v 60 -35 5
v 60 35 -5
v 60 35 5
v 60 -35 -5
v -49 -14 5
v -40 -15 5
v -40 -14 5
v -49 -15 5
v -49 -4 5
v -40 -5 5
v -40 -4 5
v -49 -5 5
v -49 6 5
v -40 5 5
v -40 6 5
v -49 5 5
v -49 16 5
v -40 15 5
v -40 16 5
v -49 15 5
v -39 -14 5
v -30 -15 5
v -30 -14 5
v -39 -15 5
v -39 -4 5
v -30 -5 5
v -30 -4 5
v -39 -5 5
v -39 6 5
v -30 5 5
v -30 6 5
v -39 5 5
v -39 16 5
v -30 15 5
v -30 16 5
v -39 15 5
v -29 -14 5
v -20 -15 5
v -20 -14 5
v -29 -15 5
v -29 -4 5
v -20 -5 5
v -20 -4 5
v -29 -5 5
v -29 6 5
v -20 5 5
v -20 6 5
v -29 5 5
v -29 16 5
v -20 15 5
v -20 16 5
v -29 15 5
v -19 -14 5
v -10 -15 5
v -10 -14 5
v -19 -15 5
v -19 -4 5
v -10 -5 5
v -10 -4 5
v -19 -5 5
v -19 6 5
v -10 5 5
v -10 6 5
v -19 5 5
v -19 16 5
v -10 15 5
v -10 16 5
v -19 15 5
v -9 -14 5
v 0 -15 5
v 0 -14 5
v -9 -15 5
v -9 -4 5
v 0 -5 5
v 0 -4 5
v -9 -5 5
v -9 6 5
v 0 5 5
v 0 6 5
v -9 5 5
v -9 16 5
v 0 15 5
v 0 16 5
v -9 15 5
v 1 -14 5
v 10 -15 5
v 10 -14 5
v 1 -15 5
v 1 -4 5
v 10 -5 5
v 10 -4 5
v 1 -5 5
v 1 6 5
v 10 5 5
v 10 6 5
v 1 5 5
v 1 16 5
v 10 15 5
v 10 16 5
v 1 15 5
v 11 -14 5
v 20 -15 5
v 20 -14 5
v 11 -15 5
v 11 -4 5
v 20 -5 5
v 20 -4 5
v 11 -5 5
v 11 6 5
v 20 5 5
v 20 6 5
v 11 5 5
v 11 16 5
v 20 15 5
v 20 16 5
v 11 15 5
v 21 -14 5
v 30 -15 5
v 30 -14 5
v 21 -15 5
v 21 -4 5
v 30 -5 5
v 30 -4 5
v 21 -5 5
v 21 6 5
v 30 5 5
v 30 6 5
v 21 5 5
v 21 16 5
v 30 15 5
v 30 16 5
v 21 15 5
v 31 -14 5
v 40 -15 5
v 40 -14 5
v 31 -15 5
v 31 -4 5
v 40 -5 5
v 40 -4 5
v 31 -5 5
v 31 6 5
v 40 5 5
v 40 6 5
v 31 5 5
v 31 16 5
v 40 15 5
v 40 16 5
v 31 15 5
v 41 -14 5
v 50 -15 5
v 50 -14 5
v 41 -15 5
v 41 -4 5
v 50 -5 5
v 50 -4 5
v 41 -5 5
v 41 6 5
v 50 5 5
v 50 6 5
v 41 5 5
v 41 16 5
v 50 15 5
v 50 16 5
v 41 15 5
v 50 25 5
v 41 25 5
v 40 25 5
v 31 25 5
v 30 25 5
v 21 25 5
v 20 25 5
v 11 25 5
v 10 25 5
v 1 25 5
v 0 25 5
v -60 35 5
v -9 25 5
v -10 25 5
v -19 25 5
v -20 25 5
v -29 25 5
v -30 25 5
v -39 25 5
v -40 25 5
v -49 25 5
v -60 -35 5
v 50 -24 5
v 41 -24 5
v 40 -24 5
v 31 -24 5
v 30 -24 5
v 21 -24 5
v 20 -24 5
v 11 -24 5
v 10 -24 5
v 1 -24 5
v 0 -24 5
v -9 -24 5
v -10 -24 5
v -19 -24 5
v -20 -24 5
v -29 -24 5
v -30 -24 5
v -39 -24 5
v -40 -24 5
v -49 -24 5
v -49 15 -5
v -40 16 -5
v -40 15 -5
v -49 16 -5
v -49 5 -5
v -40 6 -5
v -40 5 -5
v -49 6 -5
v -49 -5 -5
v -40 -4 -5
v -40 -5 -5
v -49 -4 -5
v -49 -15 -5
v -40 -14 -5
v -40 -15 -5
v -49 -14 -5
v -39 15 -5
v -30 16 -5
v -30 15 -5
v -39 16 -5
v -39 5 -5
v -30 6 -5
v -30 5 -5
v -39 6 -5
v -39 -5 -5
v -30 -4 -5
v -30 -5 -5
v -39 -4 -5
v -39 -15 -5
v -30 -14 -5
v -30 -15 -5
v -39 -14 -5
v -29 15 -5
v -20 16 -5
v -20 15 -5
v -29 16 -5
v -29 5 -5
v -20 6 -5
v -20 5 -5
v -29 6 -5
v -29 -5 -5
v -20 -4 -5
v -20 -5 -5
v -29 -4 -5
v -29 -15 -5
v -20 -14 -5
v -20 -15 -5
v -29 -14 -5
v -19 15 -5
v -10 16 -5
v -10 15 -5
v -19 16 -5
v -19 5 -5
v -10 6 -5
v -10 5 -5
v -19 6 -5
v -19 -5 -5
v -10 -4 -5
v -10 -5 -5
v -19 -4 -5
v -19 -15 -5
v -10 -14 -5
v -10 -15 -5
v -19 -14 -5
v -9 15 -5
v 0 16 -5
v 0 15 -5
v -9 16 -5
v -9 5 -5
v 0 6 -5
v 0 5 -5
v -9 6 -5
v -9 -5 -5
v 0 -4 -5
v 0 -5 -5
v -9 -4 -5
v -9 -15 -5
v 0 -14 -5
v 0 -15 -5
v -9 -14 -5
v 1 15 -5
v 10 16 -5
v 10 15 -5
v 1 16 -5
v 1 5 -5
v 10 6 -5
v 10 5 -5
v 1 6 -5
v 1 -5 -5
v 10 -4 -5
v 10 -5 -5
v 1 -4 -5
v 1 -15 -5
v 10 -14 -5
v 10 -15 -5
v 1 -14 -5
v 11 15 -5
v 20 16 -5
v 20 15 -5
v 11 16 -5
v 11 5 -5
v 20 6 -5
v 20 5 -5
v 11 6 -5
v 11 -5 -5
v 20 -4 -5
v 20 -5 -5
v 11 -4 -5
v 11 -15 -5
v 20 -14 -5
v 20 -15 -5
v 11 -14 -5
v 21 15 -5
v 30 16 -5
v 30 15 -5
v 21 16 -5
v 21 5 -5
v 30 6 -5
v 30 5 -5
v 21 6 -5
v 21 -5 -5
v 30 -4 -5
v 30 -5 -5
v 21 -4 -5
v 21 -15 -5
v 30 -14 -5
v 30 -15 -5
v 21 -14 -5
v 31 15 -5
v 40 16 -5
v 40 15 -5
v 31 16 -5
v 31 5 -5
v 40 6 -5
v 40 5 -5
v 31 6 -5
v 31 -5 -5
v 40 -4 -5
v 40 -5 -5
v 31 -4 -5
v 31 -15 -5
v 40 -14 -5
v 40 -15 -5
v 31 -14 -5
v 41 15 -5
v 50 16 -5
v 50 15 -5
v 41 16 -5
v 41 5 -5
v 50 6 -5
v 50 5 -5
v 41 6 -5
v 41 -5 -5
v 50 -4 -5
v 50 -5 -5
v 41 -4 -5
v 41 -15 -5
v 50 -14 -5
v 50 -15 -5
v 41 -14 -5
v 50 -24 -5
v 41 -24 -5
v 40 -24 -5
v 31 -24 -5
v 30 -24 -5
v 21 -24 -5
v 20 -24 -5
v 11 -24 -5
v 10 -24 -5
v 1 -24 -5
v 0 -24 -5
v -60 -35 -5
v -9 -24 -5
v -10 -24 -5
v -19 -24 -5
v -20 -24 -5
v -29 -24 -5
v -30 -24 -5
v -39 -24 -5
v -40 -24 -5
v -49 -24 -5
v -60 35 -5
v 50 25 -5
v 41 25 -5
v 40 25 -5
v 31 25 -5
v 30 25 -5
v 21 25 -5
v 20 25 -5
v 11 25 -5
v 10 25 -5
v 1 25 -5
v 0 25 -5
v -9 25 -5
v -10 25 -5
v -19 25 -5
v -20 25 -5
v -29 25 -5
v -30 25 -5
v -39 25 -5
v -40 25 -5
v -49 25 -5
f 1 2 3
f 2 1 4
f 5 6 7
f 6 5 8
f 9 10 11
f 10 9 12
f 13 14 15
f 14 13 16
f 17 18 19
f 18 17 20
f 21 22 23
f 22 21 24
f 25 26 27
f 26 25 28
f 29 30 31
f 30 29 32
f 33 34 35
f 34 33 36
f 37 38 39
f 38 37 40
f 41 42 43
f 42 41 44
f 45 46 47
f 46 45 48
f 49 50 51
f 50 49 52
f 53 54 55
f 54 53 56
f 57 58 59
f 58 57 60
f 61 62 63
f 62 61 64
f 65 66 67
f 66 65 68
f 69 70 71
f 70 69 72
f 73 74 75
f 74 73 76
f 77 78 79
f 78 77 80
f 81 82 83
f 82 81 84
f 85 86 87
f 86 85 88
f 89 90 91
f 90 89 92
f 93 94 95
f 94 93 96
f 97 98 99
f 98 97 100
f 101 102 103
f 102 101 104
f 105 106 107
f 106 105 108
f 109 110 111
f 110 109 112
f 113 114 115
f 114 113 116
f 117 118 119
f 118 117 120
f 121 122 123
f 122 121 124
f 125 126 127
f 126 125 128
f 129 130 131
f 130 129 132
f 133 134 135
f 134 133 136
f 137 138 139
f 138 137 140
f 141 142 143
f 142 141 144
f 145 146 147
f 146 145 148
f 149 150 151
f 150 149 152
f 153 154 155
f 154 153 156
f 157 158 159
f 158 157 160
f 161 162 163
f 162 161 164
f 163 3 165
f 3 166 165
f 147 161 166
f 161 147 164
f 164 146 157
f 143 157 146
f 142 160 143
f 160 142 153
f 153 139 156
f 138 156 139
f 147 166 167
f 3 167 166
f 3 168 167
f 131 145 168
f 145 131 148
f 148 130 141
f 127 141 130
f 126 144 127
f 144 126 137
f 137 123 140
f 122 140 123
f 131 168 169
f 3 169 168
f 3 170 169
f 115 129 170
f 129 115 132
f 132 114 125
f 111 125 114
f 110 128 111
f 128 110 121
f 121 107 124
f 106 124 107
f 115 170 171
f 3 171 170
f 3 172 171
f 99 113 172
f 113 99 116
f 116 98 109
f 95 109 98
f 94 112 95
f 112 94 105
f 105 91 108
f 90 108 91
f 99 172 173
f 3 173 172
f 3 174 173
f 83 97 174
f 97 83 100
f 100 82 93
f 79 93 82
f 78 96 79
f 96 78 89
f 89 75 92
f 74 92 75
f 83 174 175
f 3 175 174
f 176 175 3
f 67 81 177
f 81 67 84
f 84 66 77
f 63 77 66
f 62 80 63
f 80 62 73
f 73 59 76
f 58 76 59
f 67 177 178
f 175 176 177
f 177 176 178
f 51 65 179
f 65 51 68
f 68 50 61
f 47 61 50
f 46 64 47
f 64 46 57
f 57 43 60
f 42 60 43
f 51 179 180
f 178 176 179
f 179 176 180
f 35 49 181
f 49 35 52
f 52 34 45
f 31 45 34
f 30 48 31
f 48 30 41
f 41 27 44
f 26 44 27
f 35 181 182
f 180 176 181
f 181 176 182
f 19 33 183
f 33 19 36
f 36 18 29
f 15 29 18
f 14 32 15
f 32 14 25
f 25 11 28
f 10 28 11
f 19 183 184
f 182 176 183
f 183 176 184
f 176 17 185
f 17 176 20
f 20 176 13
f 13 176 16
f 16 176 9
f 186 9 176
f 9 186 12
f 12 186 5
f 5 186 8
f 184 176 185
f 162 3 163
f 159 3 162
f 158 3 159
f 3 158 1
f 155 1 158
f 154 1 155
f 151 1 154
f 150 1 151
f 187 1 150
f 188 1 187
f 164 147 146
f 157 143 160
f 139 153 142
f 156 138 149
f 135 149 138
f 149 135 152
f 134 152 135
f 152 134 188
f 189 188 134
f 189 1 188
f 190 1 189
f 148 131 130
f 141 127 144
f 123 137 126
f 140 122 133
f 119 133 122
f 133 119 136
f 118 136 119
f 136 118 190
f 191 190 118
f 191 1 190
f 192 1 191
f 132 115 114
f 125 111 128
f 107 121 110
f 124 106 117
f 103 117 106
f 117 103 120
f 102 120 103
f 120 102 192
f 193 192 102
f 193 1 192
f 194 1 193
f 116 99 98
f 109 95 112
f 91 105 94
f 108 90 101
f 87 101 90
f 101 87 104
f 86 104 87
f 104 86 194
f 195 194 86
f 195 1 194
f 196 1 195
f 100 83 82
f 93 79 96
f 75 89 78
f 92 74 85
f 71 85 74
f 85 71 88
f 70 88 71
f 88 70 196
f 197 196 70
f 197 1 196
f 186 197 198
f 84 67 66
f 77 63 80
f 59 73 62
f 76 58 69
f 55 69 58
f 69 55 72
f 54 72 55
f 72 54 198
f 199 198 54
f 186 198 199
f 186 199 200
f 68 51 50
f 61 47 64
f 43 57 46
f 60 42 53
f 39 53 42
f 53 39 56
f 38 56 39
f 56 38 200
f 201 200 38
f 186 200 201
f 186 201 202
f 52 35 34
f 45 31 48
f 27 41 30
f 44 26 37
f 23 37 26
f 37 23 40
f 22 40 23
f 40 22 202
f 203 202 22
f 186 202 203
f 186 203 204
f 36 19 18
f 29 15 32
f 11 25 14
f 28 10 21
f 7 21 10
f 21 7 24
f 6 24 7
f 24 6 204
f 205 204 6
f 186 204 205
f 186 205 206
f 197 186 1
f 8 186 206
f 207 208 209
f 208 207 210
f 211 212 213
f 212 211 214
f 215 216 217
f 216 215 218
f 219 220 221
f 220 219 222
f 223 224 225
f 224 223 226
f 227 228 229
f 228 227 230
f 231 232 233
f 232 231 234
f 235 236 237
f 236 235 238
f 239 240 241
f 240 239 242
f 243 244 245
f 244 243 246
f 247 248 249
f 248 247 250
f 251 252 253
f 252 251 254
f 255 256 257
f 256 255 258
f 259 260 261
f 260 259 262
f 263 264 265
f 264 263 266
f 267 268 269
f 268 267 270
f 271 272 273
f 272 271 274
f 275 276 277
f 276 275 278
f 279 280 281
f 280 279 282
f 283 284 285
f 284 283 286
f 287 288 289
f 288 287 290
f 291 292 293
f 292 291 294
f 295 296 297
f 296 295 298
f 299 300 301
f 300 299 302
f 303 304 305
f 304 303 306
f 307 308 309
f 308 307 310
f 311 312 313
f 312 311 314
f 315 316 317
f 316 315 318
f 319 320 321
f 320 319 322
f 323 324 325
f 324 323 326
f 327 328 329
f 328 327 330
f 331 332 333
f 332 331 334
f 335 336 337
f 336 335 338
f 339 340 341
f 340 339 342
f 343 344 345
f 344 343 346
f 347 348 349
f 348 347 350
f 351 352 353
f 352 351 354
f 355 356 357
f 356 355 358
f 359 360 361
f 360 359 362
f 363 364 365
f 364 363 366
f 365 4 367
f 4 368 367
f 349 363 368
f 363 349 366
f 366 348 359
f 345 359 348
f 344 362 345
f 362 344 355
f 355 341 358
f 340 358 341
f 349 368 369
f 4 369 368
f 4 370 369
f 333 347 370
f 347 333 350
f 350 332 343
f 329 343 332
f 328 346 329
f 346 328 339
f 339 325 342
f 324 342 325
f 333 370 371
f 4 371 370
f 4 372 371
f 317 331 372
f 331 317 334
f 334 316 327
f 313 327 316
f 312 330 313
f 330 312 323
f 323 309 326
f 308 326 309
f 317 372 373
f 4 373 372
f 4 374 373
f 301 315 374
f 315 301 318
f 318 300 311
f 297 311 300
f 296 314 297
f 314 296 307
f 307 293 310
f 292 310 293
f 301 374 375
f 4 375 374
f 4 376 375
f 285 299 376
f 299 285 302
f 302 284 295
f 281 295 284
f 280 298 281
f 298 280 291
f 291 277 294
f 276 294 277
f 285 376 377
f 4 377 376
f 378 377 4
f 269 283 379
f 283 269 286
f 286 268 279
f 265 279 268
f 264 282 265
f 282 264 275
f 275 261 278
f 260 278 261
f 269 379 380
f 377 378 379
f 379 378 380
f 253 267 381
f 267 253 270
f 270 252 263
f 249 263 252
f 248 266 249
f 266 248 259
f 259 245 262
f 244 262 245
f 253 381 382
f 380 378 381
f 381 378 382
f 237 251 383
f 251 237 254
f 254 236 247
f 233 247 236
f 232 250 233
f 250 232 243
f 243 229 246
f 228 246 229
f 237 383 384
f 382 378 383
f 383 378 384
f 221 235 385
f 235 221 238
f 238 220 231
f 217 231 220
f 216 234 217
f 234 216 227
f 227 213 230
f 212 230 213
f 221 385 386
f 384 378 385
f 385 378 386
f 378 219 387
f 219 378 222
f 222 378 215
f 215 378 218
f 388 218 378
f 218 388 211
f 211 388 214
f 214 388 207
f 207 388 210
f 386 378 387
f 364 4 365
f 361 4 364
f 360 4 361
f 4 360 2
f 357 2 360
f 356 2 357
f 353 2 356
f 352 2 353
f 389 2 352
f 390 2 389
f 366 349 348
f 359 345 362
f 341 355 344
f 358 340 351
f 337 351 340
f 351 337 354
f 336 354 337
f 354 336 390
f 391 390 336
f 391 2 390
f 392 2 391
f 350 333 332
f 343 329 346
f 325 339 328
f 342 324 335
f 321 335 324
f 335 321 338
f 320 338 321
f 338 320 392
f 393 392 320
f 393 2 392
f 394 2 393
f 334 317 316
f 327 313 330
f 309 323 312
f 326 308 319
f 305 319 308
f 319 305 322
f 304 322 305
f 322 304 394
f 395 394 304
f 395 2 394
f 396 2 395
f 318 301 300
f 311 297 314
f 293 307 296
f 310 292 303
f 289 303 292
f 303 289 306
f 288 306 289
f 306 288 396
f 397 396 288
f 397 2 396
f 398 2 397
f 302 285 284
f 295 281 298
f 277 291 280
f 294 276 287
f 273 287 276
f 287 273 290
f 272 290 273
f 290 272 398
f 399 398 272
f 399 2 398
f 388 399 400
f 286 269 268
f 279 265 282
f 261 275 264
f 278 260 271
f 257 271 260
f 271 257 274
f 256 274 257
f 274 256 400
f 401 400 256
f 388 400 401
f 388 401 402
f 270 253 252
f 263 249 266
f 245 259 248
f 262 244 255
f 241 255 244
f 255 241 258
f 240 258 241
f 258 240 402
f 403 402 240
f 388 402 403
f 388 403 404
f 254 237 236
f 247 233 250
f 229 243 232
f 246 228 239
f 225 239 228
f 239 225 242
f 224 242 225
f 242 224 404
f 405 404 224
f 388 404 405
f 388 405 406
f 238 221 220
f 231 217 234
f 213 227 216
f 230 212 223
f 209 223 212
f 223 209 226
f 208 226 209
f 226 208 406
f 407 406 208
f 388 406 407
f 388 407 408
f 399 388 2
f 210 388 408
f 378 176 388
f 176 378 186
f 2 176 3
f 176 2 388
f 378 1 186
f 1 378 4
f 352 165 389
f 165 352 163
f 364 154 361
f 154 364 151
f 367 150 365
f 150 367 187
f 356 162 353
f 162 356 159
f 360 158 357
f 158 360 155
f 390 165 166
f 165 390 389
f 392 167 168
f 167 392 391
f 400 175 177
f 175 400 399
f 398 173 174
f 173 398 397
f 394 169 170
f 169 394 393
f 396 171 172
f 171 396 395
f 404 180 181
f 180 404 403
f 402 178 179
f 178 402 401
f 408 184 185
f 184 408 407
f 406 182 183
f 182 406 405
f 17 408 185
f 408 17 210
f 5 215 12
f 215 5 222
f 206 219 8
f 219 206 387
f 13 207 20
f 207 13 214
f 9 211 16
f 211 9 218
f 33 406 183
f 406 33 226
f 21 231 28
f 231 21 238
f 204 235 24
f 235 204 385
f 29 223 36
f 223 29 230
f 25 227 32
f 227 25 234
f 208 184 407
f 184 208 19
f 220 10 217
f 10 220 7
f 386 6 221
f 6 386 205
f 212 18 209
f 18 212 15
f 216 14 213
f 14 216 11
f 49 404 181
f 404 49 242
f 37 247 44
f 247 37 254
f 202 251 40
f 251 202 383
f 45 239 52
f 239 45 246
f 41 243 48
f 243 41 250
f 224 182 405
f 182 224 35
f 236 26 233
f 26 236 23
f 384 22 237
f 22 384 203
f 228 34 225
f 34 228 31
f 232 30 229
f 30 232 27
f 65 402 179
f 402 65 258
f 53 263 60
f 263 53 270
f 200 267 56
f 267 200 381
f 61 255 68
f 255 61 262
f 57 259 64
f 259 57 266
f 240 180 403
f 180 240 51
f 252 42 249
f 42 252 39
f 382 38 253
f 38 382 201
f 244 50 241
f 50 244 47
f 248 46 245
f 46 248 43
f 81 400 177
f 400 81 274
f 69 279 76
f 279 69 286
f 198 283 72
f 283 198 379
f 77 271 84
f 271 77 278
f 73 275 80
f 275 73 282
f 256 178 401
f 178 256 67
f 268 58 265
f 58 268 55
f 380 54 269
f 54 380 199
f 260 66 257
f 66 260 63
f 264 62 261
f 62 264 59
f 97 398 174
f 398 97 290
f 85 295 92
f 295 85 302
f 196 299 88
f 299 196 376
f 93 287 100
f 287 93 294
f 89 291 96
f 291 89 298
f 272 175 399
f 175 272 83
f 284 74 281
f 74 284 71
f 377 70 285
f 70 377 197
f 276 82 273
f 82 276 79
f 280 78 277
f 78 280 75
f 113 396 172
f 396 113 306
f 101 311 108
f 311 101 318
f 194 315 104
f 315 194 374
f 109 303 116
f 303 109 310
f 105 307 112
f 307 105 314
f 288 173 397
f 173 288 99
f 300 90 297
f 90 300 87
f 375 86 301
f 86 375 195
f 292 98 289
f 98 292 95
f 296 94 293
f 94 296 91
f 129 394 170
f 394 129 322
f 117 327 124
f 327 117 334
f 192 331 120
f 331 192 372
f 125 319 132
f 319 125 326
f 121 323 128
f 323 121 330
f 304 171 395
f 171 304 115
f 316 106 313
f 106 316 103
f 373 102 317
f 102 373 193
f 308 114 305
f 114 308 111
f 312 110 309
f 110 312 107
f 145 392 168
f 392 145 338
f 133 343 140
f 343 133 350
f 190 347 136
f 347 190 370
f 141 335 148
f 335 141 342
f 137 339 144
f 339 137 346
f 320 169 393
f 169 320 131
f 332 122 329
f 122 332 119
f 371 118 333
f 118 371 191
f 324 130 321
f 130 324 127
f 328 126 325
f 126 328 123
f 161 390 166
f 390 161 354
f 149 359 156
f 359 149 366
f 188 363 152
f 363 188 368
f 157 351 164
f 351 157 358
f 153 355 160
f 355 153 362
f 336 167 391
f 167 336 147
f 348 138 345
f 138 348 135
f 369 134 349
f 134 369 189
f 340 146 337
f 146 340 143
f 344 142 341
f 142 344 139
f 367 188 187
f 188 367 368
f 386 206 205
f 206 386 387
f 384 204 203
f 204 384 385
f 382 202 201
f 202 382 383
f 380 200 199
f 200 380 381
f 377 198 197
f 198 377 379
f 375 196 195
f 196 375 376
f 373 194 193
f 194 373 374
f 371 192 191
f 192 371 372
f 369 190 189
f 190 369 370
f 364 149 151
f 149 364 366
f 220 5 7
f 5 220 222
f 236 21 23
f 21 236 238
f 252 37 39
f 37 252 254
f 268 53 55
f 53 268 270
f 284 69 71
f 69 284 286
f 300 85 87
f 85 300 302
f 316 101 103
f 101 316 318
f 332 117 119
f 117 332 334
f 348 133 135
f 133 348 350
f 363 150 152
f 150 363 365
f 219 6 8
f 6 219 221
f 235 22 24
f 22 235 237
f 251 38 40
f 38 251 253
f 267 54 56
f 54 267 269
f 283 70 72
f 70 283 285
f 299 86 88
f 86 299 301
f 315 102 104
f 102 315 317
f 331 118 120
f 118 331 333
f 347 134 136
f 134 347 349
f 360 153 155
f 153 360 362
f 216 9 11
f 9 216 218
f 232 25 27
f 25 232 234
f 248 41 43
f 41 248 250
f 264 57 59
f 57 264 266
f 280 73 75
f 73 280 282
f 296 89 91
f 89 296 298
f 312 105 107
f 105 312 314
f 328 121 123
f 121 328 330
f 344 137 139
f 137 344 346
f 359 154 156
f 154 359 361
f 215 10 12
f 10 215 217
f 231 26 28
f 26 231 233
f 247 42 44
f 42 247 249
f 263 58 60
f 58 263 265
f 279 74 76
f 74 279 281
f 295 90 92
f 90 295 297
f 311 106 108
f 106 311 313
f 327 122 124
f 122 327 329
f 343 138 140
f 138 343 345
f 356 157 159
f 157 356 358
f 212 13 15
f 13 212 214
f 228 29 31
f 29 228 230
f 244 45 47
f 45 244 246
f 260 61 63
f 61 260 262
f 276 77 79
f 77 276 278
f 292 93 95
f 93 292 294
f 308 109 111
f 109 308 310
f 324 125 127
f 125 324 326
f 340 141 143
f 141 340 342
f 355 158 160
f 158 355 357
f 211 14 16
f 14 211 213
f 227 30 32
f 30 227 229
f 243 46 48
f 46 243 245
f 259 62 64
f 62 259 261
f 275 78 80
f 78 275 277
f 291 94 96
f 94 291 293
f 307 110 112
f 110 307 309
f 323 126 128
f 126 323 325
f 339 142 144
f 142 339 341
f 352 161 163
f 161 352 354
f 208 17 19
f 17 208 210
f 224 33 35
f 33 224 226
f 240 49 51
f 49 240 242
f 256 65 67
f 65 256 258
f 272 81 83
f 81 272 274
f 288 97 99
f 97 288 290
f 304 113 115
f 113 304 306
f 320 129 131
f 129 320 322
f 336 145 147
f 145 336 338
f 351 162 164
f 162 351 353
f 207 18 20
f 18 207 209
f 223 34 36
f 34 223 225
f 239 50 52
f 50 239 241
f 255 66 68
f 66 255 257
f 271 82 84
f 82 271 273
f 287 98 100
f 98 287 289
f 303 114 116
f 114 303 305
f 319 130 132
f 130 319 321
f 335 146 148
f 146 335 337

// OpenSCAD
/* This module creates grids. */

module grid(
   gridX, 
   gridY, 
   borderX, 
   borderY, 
   meshSolid,    // width of solid part of grid
   meshSpace,    // width of space part of grid
   thickness) {  // z height 


   meshX=gridX-(borderX*2);
   meshY=gridY-(borderY*2);
   nX=meshX/(meshSolid+meshSpace);
   nY=meshY/(meshSolid+meshSpace);
   
   difference() {
      cube (size=[gridX,gridY,thickness],center=true);
      cube (size=[meshX,meshY,thickness],center=true);
   } /* enddifference */
   
   for (i=[0:nX]) {
      translate([-(meshX/2)+i*(meshSolid+meshSpace),
                 -meshY/2,
                 -thickness/2]) 
         cube(size=[meshSolid,meshY,thickness],center=false);
   } /* endfor */
   
   for (i=[0:nY]) {
      translate([-meshX/2,
                 -(meshY/2)+i*(meshSolid+meshSpace),
                 -thickness/2]) 
         cube(size=[meshX,meshSolid,thickness],center=false);
   } /* endfor */

} /* endmodule */

grid(120, 70, 10, 10, 1, 9, 10);
   
